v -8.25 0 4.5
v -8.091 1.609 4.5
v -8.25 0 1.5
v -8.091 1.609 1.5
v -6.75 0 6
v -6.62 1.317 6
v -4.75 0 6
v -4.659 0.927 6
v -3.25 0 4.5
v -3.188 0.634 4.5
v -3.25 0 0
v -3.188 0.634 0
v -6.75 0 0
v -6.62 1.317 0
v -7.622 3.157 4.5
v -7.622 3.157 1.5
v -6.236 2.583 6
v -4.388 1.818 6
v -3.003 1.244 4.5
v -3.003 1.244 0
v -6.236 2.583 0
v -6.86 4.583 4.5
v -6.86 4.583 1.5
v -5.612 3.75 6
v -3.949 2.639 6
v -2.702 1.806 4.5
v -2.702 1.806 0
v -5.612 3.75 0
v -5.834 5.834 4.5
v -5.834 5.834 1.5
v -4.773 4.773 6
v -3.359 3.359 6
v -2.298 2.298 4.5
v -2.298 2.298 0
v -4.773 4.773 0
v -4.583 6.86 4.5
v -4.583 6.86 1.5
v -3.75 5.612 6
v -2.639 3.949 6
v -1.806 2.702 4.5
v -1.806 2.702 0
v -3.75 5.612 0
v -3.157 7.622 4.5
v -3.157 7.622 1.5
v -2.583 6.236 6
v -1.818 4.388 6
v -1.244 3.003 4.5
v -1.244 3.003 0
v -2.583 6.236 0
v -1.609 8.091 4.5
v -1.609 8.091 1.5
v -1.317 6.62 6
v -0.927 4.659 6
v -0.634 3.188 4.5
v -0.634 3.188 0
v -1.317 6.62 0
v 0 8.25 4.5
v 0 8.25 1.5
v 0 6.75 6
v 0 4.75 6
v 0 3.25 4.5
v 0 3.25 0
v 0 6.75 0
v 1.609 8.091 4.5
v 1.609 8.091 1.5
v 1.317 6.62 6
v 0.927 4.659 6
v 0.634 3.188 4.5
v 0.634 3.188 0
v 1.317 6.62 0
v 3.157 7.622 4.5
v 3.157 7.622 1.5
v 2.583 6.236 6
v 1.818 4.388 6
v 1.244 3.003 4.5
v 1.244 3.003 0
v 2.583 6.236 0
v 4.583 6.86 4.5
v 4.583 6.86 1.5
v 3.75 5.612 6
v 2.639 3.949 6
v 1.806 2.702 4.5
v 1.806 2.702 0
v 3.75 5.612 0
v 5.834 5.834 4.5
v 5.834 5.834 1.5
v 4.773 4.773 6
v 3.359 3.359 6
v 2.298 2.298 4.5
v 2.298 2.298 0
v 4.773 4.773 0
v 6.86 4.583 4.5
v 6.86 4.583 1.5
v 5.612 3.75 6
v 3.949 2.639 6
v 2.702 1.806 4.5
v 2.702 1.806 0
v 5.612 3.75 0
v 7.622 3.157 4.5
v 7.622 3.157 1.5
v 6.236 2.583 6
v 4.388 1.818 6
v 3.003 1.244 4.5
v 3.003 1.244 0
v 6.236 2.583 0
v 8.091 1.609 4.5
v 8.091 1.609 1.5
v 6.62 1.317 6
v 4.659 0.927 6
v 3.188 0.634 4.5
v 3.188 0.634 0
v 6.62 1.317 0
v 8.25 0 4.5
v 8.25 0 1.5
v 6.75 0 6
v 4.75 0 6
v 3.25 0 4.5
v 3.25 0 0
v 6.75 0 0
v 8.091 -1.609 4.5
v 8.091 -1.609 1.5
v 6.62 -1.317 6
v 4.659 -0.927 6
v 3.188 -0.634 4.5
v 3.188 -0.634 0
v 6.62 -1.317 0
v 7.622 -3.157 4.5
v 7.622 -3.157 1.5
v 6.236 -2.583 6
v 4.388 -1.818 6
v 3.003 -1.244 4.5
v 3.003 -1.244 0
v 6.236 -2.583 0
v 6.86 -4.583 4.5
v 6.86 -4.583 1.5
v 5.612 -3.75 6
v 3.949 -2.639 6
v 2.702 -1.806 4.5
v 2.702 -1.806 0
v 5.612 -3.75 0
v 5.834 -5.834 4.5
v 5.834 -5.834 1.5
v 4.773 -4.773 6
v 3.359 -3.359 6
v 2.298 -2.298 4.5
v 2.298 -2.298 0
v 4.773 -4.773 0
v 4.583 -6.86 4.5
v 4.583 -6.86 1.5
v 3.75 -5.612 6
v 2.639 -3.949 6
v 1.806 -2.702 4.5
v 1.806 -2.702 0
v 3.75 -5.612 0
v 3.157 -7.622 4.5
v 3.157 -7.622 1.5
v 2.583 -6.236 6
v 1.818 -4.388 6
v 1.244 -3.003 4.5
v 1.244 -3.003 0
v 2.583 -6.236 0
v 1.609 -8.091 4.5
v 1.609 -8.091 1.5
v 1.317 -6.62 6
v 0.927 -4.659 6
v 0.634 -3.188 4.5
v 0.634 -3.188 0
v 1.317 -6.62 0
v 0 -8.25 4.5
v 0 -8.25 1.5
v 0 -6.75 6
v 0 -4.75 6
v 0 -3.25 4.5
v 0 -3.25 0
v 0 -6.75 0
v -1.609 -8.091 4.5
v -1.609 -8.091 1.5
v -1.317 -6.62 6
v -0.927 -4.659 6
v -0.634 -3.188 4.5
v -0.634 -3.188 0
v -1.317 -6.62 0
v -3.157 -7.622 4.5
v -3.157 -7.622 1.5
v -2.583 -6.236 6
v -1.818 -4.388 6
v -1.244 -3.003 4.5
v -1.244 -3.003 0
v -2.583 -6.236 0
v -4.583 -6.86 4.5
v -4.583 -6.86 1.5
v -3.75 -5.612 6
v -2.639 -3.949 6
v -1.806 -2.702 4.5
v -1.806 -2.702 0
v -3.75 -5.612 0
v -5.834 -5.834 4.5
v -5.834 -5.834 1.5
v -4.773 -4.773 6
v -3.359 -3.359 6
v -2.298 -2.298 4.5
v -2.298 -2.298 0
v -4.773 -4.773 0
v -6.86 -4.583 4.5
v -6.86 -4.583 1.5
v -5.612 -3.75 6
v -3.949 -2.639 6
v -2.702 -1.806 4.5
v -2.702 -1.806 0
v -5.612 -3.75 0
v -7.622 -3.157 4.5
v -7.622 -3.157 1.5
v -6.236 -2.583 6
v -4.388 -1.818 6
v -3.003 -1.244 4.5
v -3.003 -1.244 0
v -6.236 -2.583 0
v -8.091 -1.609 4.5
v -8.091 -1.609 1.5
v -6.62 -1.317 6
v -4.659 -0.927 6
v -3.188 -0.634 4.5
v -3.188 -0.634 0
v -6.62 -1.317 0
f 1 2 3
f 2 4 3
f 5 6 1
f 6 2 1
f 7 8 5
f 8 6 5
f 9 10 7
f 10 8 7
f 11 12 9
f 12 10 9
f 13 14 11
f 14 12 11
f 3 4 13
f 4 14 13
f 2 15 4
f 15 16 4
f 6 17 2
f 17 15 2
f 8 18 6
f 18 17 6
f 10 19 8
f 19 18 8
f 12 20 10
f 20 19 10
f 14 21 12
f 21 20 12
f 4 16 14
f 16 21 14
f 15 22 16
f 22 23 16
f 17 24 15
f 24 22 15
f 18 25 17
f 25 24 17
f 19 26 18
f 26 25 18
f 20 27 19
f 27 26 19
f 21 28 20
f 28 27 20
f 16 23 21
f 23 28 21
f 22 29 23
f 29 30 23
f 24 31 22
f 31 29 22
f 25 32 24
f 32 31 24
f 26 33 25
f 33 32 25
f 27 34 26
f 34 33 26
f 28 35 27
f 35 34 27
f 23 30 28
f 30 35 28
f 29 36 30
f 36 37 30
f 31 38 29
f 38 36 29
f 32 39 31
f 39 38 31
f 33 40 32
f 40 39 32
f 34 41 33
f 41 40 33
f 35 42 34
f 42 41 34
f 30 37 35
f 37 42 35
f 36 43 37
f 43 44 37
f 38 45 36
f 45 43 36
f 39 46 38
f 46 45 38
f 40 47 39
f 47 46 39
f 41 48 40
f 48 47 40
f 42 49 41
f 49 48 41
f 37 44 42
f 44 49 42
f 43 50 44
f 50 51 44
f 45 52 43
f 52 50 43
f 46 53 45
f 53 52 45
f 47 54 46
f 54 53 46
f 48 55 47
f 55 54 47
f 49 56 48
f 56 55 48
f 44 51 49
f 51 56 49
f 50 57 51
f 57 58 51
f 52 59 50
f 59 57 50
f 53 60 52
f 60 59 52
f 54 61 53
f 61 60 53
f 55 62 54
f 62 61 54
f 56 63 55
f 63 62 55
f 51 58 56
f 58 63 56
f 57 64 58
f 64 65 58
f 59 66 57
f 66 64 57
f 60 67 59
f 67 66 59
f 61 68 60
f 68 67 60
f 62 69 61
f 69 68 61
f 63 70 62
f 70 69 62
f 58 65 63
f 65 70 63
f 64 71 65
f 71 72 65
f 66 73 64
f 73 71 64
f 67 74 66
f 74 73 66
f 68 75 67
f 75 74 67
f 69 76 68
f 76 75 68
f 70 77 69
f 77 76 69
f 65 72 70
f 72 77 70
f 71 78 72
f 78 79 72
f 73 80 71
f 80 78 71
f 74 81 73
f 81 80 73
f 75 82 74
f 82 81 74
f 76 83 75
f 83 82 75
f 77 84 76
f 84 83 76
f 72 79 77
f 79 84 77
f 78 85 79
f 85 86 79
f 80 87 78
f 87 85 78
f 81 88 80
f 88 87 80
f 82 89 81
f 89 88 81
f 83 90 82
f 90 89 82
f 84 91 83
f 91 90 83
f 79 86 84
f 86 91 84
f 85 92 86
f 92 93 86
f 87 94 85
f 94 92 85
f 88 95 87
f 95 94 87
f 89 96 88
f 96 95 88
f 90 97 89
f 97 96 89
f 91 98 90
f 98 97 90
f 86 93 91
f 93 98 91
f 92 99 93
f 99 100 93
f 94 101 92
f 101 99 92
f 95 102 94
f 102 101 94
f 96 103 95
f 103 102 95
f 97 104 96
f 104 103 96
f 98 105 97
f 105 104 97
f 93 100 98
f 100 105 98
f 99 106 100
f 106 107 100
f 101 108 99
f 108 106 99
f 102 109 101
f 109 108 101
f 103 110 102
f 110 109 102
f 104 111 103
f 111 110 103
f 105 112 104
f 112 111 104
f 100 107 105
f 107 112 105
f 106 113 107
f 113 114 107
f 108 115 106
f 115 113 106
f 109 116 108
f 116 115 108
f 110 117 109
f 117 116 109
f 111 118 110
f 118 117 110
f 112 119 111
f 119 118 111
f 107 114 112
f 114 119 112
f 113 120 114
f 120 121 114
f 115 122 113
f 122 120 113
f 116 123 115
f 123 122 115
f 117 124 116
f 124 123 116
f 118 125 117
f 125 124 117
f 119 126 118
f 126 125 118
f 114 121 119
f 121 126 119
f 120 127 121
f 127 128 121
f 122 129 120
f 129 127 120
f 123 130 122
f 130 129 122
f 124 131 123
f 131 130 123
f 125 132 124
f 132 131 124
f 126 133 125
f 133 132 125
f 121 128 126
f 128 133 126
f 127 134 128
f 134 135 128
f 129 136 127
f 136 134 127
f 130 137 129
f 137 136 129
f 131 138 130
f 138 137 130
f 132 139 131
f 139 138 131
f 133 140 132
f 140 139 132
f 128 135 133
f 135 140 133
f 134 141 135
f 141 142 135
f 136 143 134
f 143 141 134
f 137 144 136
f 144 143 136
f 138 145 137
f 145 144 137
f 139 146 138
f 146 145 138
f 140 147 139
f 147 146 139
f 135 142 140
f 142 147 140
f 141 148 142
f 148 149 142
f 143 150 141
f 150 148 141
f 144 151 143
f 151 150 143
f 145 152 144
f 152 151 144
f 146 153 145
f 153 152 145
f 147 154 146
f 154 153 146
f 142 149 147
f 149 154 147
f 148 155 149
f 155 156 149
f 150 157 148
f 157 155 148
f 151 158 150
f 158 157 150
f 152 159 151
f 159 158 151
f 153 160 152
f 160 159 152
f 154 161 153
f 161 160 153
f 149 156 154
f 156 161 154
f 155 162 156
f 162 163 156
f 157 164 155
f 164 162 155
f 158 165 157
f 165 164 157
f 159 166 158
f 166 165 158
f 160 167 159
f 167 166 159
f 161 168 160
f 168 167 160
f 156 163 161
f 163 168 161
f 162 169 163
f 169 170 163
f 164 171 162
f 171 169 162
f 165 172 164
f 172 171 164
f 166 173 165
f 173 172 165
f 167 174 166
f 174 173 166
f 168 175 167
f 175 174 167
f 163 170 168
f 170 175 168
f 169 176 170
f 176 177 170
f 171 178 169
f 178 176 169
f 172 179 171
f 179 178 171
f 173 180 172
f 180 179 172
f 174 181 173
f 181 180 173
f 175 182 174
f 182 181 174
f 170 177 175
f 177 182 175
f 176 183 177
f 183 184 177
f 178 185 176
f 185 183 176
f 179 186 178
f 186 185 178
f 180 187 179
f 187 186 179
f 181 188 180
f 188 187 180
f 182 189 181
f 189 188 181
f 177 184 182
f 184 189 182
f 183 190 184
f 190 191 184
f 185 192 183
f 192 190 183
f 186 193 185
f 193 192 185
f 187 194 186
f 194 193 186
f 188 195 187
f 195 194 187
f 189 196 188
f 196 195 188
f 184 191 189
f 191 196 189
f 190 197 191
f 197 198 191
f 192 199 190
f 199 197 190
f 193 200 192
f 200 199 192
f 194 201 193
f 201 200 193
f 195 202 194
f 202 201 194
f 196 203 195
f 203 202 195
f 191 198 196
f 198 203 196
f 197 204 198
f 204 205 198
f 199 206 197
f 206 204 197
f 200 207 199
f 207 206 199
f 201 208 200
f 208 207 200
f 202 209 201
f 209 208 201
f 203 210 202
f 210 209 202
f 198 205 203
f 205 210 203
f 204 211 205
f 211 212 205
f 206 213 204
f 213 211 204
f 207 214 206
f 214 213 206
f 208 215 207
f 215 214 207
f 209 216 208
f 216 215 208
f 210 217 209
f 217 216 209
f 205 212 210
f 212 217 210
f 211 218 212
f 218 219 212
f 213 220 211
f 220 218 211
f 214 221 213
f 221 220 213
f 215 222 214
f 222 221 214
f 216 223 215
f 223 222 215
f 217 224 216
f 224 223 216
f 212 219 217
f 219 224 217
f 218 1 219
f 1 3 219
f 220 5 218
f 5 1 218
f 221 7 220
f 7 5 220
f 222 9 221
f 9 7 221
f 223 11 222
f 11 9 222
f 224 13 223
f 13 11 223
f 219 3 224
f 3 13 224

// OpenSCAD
$fn = 32;

// ----------------------------------------------------------------------
// Form washer: chamfered washer, 16.5 mm outside, 6.5 mm bore
// ----------------------------------------------------------------------

// --- parameters (mm) ---
revolve_angle = 360;      // full turn around the Z axis
profile_points = 7;       // points of the closed outline

profile = [[3.25, 0], [6.75, 0], [8.25, 1.5], [8.25, 4.5], [6.75, 6], [4.75, 6], [3.25, 4.5]];  // single closed polygon, 7 points, counter clockwise

// --- the one profile operation ---
rotate_extrude(angle = revolve_angle) polygon(points = profile);
